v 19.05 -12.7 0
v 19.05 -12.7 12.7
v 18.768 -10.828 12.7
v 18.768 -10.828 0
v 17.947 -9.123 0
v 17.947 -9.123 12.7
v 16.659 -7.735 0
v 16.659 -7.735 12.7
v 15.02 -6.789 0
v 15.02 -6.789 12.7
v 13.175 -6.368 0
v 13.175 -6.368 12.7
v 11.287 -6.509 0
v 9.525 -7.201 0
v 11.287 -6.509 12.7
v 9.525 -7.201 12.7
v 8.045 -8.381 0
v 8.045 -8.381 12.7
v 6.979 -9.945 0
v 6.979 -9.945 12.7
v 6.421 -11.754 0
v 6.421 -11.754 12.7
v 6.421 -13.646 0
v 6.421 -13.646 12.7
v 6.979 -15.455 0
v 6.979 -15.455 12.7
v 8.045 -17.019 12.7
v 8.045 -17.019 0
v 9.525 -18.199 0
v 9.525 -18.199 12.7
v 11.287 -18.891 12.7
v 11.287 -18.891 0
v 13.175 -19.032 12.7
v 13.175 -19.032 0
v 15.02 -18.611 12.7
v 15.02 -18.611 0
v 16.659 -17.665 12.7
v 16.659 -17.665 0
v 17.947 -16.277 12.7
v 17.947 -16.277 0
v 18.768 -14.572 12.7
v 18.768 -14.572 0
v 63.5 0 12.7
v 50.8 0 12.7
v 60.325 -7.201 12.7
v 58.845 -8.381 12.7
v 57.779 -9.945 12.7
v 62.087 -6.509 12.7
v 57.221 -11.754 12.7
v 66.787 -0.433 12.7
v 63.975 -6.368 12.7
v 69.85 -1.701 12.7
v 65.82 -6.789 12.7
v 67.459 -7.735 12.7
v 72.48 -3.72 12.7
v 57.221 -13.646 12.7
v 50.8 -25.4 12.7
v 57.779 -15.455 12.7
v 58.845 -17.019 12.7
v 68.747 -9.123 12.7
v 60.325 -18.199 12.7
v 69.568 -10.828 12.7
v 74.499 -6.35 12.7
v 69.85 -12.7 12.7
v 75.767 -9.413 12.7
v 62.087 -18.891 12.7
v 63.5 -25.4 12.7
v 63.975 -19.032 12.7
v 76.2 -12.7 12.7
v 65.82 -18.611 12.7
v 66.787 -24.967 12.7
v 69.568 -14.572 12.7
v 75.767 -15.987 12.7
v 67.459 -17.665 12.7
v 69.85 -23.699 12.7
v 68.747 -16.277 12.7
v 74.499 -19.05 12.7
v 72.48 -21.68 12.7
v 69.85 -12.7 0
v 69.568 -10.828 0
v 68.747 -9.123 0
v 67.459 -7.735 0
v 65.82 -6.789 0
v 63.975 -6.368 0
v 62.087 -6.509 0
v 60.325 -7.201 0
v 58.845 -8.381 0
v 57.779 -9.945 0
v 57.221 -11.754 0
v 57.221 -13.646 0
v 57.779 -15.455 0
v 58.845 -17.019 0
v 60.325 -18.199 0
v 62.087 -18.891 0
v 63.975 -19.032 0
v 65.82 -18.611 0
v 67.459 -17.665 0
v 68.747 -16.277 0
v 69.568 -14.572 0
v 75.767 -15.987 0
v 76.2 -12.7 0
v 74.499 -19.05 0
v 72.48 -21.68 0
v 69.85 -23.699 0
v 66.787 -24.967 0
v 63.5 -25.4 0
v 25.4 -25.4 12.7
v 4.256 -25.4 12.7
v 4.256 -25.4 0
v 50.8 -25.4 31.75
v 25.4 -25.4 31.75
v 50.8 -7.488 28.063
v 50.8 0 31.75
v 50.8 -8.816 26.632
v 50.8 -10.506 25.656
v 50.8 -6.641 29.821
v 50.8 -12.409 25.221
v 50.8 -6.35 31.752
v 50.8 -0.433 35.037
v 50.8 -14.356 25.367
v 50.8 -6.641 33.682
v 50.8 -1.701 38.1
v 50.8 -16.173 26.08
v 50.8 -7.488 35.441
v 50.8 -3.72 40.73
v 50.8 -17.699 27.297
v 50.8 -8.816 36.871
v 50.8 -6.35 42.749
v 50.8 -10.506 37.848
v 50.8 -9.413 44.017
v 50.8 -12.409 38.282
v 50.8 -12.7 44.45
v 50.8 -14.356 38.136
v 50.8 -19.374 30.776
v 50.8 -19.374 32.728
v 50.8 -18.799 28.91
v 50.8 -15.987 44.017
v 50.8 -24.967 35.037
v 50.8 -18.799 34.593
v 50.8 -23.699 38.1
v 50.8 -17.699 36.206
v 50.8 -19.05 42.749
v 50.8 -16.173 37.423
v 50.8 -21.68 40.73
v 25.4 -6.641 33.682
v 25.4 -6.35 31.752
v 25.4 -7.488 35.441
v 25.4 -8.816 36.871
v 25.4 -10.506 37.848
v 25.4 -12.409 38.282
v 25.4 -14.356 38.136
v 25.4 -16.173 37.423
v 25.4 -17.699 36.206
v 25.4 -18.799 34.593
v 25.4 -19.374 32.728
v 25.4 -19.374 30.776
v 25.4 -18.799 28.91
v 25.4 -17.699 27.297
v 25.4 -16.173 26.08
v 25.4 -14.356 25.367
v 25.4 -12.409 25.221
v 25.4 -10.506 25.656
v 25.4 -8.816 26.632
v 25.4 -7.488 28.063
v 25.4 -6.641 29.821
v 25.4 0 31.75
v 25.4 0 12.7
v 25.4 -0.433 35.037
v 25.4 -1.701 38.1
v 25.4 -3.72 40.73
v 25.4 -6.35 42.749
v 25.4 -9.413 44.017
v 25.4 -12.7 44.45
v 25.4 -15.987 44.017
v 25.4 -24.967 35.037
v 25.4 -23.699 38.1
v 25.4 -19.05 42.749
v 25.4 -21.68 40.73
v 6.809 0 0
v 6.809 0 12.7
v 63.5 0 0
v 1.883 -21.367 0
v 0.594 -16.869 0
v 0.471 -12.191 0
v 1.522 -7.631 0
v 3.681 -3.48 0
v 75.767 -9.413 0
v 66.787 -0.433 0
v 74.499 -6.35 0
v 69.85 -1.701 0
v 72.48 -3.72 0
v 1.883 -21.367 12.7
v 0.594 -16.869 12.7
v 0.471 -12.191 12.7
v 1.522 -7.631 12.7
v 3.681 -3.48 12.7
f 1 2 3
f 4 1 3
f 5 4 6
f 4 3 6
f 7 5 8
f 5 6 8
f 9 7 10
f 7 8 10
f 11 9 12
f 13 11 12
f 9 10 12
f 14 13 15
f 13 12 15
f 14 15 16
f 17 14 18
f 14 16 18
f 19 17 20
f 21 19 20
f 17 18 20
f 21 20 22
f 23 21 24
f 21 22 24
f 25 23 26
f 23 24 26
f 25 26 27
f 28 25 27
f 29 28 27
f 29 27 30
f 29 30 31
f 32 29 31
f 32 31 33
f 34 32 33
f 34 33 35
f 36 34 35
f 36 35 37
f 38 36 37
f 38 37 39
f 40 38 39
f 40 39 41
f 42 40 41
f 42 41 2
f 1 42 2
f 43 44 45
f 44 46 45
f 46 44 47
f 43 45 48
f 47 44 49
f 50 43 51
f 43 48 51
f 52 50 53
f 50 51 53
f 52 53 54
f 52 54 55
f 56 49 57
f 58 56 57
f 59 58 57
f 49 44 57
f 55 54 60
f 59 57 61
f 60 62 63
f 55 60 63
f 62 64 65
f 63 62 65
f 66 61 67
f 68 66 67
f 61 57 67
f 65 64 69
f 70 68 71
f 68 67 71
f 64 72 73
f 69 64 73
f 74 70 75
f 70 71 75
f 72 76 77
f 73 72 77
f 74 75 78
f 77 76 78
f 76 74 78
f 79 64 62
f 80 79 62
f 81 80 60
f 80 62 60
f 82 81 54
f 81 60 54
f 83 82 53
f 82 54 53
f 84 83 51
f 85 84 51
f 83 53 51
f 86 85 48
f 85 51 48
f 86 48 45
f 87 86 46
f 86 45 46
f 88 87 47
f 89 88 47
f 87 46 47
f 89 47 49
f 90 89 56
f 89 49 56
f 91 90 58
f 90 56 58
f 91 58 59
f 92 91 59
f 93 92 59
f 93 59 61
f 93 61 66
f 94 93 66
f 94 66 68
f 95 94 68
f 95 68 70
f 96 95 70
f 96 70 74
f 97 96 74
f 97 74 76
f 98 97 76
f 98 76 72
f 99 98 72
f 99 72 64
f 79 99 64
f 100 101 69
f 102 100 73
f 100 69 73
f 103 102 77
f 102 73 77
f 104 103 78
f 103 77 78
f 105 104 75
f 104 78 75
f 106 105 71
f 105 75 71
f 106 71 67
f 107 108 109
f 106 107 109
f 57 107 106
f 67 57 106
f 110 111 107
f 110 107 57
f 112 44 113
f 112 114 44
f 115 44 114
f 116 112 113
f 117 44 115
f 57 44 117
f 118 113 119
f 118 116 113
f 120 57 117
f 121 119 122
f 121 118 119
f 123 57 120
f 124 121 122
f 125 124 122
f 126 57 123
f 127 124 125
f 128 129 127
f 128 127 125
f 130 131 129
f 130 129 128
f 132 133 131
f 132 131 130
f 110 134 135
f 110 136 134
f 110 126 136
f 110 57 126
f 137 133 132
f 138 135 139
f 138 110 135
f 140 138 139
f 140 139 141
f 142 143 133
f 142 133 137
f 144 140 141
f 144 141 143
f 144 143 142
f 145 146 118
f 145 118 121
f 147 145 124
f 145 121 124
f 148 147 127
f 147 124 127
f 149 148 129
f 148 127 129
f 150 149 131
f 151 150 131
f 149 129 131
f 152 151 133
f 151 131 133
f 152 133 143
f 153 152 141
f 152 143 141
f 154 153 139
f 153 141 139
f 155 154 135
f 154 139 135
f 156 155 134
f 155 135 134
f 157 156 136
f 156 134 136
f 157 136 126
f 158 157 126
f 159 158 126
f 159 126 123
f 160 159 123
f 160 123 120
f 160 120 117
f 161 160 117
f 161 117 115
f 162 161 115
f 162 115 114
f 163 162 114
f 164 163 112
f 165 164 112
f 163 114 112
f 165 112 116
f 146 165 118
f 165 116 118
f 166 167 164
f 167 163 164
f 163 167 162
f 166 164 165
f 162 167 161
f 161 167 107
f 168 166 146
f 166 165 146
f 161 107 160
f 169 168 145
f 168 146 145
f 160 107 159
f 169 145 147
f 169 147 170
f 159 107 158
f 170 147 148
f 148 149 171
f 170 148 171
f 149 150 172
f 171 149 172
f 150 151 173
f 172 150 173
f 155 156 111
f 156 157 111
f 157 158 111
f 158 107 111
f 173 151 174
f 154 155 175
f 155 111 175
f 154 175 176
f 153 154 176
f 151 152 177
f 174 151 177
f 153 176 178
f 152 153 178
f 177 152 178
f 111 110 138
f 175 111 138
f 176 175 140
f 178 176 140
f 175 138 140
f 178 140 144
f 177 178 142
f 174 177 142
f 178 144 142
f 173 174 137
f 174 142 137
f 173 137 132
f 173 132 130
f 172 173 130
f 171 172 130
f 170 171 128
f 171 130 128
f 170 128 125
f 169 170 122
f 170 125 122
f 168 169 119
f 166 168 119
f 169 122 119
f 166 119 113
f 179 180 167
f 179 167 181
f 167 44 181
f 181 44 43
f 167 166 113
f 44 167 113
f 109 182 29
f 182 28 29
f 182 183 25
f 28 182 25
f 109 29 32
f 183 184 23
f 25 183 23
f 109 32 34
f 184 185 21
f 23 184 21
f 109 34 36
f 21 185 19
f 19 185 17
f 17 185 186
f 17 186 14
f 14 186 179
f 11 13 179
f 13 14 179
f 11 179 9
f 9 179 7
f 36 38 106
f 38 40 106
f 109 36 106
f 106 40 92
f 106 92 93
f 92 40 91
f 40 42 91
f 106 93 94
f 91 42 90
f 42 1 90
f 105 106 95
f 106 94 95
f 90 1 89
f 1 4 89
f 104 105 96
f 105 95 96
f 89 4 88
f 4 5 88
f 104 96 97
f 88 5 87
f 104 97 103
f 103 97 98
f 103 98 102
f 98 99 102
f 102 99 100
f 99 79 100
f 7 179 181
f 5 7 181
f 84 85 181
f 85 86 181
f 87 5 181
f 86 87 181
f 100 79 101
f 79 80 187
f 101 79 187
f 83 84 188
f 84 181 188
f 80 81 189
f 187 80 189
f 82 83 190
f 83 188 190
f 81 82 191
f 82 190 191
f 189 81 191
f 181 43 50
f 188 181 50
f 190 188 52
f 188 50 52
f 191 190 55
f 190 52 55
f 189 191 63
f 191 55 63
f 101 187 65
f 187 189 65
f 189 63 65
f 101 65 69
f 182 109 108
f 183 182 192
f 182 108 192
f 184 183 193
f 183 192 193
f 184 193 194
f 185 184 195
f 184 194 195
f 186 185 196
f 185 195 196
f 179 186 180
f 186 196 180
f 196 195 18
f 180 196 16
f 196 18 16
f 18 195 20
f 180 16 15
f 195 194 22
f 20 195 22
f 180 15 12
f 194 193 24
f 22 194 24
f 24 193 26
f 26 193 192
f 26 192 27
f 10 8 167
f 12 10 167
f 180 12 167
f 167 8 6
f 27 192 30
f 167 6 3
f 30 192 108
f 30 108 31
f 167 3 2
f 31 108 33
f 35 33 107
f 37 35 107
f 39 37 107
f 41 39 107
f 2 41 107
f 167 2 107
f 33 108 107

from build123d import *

# Parameters (mm, degrees)
F0_W      = 76.2
F0_H      = 44.45
F1_DEPTH  = 25.4
F2_W      = 25.4
F2_H      = 31.75
F3_DEPTH  = 25.4
F4_R      = 6.5486317255
F5_DEPTH  = 25.4
F6_R      = 6.35
F7_DEPTH  = 25.4
F9_DEPTH  = 25.4
F10_R     = 6.35
F11_DEPTH = 25.4


with BuildPart() as f1:
    # F0 (on Front) → F1 (new body)
    with BuildSketch(Plane.XZ):
        with Locations((38.1, 22.225)):
            Rectangle(F0_W, F0_H)
    extrude(amount=F1_DEPTH)

    # F2 (on face) → F3 (cut)
    with BuildSketch(Plane.XZ.offset(25.4)):
        with Locations((63.5, 28.575)):
            Rectangle(F2_W, F2_H)
        with Locations((12.7, 28.575)):
            Rectangle(F2_W, F2_H)
    extrude(amount=-F3_DEPTH, mode=Mode.SUBTRACT)

    # F4 (on face) → F5 (cut)
    with BuildSketch(Plane.YZ.offset(50.8)):
        with Locations((-12.8986317255, 31.7515534242)):
            Circle(F4_R)
        with BuildLine():
            ThreePointArc((-25.4, 31.75), (-21.6802561211, 40.7302561211), (-12.7, 44.45))
            Line((-12.7, 44.45), (-25.4, 44.45))
            Line((-25.4, 44.45), (-25.4, 31.75))
        make_face()
        with BuildLine():
            ThreePointArc((-12.7, 44.45), (-3.7197438789, 40.7302561211), (0, 31.75))
            Line((0, 31.75), (0, 44.45))
            Line((0, 44.45), (-12.7, 44.45))
        make_face()
    extrude(amount=-F5_DEPTH, mode=Mode.SUBTRACT)

    # F6 (on face) → F7 (cut)
    with BuildSketch(Plane.XY.offset(12.7)):
        with Locations((63.5, -12.7)):
            Circle(F6_R)
    extrude(amount=-F7_DEPTH, mode=Mode.SUBTRACT)

    # F8 (on face) → F9 (cut)
    with BuildSketch(Plane.XY.offset(12.7)):
        with BuildLine():
            ThreePointArc((63.5, 0), (72.4802561211, -3.7197438789), (76.2, -12.7))
            Line((76.2, -12.7), (76.2, 0))
            Line((76.2, 0), (63.5, 0))
        make_face()
        with BuildLine():
            ThreePointArc((76.2, -12.7), (72.4802561211, -21.6802561211), (63.5, -25.4))
            Line((63.5, -25.4), (76.2, -25.4))
            Line((76.2, -25.4), (76.2, -12.7))
        make_face()
    extrude(amount=-F9_DEPTH, mode=Mode.SUBTRACT)

    # F10 (on face) → F11 (cut)
    with BuildSketch(Plane.XY.offset(12.7)):
        with BuildLine():
            ThreePointArc((4.2558507994, -25.4), (0.4710381636, -12.1911505721), (6.809362676, 0))
            Line((6.809362676, 0), (0, 0))
            Line((0, 0), (0, -25.4))
            Line((0, -25.4), (4.2558507994, -25.4))
        make_face()
        with Locations((12.7, -12.7)):
            Circle(F10_R)
    extrude(amount=-F11_DEPTH, mode=Mode.SUBTRACT)


solid = f1.part
